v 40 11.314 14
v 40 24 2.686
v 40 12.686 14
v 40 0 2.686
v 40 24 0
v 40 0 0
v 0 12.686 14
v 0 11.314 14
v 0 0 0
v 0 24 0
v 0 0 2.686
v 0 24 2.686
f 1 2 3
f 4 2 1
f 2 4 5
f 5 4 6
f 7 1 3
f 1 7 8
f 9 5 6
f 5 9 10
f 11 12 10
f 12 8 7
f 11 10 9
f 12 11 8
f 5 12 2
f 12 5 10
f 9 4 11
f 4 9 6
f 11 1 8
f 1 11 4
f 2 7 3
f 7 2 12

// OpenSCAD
// Bevel: same construction as a chamfer but a larger, symmetric angled
// face on a thicker block (both top edges beveled), to read as a
// structural/visual bevel rather than a small functional edge-break.
$fn = 32;
sx = 40; sy = 24; sz = 14;
b  = 8; // bevel size (larger relative to block than chamfer.scad's c)

difference() {
    cube([sx, sy, sz]);
    translate([sx / 2, 0, sz])
    rotate([45, 0, 0])
    cube([sx + 2, b * 2, b * 2], center = true);
    translate([sx / 2, sy, sz])
    rotate([45, 0, 0])
    cube([sx + 2, b * 2, b * 2], center = true);
}
